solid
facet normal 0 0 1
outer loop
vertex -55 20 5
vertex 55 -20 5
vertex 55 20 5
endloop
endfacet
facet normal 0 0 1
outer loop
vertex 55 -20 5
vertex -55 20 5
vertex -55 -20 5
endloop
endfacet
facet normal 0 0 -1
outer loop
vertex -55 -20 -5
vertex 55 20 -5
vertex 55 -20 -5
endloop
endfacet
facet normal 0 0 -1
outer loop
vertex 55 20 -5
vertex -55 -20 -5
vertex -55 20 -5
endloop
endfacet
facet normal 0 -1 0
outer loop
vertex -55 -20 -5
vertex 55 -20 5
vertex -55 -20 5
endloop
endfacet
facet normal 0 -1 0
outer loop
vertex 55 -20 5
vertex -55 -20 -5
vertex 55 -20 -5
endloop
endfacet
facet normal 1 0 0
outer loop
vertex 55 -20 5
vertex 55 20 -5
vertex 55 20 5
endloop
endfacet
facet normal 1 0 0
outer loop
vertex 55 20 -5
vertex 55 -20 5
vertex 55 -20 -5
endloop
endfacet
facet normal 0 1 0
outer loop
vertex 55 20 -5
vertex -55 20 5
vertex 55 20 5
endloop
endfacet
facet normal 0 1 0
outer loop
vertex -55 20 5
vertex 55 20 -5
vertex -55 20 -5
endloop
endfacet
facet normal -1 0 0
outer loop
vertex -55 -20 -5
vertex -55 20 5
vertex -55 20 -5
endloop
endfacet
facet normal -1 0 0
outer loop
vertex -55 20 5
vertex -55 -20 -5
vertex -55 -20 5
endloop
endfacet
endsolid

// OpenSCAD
intersection(){
  face();
  letters();
}
base();


module face(){
translate([-55,0,-0]) rotate([90,0,0])
  linear_extrude(height=40,center=true)
    import("./wolves.dxf");}

module letters(){
translate([0,0,112.5]) rotate([90,0,-90])
  linear_extrude(height=120,center=true)
    text("TEXT",size=30,direction="ttb",spacing=0.7);}

module base(){
translate([-55,-20,-5])
  cube([110,40,10]);}
